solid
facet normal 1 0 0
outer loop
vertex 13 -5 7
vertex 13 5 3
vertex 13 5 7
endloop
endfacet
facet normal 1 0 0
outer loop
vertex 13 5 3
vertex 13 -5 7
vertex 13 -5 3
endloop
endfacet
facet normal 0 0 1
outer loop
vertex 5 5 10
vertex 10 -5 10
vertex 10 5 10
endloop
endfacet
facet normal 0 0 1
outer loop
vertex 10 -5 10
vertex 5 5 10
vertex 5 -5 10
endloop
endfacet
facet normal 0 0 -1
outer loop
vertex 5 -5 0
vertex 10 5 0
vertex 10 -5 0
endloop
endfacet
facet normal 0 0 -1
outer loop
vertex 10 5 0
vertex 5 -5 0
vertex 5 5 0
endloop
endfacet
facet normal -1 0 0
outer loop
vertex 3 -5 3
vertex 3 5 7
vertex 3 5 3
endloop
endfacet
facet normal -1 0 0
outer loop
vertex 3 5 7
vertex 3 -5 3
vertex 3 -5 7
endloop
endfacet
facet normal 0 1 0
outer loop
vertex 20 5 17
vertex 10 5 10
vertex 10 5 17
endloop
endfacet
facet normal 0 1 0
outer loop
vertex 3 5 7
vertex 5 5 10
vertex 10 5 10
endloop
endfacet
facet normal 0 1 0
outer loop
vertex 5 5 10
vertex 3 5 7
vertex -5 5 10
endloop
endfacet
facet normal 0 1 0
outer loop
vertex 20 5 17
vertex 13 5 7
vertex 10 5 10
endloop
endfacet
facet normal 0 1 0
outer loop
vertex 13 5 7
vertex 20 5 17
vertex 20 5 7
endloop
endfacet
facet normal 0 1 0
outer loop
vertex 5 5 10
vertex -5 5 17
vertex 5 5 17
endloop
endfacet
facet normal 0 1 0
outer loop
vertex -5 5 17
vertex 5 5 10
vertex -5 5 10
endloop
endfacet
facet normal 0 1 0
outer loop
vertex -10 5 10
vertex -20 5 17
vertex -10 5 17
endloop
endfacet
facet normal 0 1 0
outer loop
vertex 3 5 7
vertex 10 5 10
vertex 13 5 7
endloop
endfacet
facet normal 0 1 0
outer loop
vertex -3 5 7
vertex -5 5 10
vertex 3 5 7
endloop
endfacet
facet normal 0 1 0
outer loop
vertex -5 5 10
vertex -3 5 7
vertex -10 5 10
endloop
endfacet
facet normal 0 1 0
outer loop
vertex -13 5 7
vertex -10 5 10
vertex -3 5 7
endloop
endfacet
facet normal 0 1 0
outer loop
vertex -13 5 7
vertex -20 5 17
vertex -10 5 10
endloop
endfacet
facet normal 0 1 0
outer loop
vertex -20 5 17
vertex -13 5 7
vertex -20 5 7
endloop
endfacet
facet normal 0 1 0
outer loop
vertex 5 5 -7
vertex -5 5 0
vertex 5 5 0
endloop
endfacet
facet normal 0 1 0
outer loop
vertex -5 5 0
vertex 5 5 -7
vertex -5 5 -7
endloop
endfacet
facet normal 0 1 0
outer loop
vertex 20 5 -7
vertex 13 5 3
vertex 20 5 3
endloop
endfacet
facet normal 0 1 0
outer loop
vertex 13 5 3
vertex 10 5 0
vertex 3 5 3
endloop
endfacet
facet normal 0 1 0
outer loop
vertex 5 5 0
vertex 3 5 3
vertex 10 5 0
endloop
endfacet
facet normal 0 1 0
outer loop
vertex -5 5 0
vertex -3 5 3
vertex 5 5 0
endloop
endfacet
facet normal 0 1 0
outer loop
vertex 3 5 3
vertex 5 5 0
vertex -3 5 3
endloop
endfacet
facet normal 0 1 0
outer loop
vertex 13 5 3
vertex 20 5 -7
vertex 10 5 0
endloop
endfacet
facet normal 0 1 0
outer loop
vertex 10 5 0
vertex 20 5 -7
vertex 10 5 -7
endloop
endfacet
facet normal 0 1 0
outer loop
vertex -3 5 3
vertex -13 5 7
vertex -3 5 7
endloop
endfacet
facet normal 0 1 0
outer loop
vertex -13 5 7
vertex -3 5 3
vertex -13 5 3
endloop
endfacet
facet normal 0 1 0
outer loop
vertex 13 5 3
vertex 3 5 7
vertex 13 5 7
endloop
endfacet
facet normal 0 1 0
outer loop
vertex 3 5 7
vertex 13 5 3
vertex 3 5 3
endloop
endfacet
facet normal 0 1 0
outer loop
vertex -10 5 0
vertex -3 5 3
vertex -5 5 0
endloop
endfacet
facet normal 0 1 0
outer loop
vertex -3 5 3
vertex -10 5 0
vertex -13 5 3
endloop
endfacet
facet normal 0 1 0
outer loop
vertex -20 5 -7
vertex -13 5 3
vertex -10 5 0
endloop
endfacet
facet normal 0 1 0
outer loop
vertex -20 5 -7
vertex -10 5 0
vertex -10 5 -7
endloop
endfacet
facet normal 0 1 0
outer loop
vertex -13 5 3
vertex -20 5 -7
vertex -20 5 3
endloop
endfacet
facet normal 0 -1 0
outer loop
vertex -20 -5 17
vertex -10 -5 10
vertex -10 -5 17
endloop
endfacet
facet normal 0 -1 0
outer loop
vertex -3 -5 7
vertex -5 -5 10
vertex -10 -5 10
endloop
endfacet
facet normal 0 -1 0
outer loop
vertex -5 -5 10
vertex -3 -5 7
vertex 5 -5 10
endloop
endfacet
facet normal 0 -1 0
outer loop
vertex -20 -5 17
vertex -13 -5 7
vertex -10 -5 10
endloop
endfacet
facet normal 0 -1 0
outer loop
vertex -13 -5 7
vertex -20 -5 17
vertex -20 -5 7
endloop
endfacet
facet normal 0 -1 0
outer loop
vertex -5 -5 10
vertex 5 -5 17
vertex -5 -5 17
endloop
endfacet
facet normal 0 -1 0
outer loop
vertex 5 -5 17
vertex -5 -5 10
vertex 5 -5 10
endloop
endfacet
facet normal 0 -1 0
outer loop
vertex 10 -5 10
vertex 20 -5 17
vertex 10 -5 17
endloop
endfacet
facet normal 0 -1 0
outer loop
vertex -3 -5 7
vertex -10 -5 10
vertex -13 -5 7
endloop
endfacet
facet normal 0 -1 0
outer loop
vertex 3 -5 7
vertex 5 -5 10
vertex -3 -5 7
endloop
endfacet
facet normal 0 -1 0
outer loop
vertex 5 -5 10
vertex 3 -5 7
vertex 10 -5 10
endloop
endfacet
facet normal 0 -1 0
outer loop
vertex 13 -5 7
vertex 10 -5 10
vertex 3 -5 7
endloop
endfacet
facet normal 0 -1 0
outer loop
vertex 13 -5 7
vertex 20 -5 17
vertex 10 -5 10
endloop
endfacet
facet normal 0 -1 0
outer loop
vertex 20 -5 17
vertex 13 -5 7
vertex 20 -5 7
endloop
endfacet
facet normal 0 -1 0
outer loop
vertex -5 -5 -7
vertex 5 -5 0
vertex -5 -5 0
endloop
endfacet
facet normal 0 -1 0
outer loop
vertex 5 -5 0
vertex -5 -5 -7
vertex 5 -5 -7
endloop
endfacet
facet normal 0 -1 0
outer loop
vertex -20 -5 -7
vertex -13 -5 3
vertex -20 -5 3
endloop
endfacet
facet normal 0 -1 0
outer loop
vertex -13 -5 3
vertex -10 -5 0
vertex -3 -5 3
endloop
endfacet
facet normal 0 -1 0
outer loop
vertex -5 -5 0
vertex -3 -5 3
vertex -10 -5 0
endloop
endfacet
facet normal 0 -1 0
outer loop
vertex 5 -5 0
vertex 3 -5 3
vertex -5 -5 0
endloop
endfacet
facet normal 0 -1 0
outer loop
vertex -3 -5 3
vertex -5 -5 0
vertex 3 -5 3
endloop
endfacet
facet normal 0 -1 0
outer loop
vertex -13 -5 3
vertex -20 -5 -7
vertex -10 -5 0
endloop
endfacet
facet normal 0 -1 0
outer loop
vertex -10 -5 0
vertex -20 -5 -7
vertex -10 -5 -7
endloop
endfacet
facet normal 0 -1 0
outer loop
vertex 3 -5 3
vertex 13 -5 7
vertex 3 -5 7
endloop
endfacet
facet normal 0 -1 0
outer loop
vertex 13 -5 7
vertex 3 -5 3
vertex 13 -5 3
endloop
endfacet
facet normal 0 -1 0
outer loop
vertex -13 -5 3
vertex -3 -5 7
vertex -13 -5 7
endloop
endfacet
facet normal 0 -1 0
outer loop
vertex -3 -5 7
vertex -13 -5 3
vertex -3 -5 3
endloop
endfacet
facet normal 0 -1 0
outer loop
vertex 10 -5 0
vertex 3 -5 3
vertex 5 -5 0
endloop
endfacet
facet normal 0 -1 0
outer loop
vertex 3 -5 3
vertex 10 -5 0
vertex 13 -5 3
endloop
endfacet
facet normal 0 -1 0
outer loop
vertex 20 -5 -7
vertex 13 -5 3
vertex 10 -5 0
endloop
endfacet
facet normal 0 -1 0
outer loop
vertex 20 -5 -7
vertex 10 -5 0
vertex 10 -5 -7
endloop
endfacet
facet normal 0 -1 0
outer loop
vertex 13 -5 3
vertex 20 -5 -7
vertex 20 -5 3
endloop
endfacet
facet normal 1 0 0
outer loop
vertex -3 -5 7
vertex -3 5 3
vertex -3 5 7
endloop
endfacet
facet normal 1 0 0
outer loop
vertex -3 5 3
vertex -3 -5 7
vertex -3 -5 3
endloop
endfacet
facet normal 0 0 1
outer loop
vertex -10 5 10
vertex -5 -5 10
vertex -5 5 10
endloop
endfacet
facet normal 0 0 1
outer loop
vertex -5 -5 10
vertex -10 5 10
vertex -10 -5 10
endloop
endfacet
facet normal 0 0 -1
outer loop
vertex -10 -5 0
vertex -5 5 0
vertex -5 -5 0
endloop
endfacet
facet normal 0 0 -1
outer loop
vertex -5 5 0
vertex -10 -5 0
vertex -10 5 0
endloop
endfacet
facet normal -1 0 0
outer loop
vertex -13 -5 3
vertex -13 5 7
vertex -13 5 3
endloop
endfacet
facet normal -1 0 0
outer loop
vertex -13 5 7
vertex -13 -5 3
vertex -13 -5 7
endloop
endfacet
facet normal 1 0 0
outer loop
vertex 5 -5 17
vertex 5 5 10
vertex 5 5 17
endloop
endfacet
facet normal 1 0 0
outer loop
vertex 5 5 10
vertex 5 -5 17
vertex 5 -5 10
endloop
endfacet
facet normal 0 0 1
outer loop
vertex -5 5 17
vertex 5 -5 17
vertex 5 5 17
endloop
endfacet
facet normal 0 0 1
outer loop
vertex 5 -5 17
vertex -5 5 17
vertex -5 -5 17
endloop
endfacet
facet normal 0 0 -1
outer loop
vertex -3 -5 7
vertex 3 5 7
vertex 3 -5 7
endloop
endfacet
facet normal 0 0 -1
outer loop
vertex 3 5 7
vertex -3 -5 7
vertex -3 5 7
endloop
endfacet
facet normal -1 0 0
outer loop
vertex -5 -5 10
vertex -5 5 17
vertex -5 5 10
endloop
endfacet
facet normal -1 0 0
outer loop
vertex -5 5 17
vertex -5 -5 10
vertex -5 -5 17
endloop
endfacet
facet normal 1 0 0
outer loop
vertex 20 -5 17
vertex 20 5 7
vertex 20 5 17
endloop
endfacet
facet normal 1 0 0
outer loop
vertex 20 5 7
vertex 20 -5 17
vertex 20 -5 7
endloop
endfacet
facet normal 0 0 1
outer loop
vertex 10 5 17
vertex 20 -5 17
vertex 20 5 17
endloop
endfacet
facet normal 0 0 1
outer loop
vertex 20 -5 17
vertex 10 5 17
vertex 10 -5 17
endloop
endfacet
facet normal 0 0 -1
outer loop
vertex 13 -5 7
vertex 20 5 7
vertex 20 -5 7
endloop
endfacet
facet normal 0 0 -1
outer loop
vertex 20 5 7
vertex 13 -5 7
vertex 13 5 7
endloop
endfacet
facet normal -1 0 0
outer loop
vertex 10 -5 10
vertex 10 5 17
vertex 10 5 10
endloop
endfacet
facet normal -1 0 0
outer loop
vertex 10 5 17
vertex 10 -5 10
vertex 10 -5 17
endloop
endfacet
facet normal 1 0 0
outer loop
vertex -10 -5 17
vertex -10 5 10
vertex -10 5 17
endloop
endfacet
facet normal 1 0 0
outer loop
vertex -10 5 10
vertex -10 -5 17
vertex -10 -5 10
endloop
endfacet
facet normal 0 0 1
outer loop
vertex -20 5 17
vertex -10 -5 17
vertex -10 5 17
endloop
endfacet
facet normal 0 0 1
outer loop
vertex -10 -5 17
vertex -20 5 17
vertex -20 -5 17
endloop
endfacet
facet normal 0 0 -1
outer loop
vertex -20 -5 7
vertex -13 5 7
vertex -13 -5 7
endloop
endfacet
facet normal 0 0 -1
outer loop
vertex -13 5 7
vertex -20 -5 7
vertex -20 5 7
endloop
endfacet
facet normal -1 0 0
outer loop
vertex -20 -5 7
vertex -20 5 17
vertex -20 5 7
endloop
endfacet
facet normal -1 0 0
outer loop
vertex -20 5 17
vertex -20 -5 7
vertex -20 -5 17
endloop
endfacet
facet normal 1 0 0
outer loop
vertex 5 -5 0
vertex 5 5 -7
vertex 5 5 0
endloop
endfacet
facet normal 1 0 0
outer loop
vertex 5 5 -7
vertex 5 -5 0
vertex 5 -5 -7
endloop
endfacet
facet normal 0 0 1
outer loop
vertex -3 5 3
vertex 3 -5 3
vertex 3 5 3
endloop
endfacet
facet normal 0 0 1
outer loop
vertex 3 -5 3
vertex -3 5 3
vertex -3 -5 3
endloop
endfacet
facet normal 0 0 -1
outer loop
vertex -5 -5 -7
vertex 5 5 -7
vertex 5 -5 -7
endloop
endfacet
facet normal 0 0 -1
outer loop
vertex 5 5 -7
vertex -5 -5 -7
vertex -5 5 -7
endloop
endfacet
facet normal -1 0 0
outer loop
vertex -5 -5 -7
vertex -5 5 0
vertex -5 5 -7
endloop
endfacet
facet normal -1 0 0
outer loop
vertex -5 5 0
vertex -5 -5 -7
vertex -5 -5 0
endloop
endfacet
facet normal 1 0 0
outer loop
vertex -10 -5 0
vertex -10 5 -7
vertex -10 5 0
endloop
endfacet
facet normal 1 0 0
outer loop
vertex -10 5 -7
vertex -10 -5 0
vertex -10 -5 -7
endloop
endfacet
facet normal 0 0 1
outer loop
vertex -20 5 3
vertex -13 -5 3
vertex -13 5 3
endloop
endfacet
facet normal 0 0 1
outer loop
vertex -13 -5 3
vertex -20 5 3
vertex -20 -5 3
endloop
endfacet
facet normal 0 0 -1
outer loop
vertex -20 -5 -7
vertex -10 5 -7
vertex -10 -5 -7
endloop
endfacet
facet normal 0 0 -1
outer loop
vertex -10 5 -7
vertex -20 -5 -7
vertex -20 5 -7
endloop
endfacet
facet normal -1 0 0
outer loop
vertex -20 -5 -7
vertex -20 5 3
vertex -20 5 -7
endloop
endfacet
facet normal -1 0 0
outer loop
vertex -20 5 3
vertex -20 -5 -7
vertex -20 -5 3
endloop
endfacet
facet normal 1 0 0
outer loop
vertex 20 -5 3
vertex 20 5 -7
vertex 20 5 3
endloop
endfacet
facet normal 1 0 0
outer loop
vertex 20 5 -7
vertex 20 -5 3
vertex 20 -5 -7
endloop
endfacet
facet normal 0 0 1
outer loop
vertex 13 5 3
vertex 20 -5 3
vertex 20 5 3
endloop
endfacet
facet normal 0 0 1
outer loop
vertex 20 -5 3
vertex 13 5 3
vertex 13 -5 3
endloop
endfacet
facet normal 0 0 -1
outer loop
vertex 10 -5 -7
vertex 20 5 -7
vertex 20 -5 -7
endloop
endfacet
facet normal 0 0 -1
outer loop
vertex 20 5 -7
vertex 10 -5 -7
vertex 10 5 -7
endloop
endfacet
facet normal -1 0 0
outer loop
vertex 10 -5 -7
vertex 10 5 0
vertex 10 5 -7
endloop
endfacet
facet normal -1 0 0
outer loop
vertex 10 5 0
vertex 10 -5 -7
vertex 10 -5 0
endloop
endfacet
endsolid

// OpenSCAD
translate([3, -5, 0])
cube(10.0);
translate([-13, -5, 0])
cube(10.0);

translate([-5, -5, 7])
cube(10.0);

translate([10, -5, 7])
cube(10.0);

translate([-20, -5, 7])
cube(10.0);


translate([-5, -5, -7])
cube(10.0);

translate([-20, -5, -7])
cube(10.0);

translate([10, -5, -7])
cube(10.0);
